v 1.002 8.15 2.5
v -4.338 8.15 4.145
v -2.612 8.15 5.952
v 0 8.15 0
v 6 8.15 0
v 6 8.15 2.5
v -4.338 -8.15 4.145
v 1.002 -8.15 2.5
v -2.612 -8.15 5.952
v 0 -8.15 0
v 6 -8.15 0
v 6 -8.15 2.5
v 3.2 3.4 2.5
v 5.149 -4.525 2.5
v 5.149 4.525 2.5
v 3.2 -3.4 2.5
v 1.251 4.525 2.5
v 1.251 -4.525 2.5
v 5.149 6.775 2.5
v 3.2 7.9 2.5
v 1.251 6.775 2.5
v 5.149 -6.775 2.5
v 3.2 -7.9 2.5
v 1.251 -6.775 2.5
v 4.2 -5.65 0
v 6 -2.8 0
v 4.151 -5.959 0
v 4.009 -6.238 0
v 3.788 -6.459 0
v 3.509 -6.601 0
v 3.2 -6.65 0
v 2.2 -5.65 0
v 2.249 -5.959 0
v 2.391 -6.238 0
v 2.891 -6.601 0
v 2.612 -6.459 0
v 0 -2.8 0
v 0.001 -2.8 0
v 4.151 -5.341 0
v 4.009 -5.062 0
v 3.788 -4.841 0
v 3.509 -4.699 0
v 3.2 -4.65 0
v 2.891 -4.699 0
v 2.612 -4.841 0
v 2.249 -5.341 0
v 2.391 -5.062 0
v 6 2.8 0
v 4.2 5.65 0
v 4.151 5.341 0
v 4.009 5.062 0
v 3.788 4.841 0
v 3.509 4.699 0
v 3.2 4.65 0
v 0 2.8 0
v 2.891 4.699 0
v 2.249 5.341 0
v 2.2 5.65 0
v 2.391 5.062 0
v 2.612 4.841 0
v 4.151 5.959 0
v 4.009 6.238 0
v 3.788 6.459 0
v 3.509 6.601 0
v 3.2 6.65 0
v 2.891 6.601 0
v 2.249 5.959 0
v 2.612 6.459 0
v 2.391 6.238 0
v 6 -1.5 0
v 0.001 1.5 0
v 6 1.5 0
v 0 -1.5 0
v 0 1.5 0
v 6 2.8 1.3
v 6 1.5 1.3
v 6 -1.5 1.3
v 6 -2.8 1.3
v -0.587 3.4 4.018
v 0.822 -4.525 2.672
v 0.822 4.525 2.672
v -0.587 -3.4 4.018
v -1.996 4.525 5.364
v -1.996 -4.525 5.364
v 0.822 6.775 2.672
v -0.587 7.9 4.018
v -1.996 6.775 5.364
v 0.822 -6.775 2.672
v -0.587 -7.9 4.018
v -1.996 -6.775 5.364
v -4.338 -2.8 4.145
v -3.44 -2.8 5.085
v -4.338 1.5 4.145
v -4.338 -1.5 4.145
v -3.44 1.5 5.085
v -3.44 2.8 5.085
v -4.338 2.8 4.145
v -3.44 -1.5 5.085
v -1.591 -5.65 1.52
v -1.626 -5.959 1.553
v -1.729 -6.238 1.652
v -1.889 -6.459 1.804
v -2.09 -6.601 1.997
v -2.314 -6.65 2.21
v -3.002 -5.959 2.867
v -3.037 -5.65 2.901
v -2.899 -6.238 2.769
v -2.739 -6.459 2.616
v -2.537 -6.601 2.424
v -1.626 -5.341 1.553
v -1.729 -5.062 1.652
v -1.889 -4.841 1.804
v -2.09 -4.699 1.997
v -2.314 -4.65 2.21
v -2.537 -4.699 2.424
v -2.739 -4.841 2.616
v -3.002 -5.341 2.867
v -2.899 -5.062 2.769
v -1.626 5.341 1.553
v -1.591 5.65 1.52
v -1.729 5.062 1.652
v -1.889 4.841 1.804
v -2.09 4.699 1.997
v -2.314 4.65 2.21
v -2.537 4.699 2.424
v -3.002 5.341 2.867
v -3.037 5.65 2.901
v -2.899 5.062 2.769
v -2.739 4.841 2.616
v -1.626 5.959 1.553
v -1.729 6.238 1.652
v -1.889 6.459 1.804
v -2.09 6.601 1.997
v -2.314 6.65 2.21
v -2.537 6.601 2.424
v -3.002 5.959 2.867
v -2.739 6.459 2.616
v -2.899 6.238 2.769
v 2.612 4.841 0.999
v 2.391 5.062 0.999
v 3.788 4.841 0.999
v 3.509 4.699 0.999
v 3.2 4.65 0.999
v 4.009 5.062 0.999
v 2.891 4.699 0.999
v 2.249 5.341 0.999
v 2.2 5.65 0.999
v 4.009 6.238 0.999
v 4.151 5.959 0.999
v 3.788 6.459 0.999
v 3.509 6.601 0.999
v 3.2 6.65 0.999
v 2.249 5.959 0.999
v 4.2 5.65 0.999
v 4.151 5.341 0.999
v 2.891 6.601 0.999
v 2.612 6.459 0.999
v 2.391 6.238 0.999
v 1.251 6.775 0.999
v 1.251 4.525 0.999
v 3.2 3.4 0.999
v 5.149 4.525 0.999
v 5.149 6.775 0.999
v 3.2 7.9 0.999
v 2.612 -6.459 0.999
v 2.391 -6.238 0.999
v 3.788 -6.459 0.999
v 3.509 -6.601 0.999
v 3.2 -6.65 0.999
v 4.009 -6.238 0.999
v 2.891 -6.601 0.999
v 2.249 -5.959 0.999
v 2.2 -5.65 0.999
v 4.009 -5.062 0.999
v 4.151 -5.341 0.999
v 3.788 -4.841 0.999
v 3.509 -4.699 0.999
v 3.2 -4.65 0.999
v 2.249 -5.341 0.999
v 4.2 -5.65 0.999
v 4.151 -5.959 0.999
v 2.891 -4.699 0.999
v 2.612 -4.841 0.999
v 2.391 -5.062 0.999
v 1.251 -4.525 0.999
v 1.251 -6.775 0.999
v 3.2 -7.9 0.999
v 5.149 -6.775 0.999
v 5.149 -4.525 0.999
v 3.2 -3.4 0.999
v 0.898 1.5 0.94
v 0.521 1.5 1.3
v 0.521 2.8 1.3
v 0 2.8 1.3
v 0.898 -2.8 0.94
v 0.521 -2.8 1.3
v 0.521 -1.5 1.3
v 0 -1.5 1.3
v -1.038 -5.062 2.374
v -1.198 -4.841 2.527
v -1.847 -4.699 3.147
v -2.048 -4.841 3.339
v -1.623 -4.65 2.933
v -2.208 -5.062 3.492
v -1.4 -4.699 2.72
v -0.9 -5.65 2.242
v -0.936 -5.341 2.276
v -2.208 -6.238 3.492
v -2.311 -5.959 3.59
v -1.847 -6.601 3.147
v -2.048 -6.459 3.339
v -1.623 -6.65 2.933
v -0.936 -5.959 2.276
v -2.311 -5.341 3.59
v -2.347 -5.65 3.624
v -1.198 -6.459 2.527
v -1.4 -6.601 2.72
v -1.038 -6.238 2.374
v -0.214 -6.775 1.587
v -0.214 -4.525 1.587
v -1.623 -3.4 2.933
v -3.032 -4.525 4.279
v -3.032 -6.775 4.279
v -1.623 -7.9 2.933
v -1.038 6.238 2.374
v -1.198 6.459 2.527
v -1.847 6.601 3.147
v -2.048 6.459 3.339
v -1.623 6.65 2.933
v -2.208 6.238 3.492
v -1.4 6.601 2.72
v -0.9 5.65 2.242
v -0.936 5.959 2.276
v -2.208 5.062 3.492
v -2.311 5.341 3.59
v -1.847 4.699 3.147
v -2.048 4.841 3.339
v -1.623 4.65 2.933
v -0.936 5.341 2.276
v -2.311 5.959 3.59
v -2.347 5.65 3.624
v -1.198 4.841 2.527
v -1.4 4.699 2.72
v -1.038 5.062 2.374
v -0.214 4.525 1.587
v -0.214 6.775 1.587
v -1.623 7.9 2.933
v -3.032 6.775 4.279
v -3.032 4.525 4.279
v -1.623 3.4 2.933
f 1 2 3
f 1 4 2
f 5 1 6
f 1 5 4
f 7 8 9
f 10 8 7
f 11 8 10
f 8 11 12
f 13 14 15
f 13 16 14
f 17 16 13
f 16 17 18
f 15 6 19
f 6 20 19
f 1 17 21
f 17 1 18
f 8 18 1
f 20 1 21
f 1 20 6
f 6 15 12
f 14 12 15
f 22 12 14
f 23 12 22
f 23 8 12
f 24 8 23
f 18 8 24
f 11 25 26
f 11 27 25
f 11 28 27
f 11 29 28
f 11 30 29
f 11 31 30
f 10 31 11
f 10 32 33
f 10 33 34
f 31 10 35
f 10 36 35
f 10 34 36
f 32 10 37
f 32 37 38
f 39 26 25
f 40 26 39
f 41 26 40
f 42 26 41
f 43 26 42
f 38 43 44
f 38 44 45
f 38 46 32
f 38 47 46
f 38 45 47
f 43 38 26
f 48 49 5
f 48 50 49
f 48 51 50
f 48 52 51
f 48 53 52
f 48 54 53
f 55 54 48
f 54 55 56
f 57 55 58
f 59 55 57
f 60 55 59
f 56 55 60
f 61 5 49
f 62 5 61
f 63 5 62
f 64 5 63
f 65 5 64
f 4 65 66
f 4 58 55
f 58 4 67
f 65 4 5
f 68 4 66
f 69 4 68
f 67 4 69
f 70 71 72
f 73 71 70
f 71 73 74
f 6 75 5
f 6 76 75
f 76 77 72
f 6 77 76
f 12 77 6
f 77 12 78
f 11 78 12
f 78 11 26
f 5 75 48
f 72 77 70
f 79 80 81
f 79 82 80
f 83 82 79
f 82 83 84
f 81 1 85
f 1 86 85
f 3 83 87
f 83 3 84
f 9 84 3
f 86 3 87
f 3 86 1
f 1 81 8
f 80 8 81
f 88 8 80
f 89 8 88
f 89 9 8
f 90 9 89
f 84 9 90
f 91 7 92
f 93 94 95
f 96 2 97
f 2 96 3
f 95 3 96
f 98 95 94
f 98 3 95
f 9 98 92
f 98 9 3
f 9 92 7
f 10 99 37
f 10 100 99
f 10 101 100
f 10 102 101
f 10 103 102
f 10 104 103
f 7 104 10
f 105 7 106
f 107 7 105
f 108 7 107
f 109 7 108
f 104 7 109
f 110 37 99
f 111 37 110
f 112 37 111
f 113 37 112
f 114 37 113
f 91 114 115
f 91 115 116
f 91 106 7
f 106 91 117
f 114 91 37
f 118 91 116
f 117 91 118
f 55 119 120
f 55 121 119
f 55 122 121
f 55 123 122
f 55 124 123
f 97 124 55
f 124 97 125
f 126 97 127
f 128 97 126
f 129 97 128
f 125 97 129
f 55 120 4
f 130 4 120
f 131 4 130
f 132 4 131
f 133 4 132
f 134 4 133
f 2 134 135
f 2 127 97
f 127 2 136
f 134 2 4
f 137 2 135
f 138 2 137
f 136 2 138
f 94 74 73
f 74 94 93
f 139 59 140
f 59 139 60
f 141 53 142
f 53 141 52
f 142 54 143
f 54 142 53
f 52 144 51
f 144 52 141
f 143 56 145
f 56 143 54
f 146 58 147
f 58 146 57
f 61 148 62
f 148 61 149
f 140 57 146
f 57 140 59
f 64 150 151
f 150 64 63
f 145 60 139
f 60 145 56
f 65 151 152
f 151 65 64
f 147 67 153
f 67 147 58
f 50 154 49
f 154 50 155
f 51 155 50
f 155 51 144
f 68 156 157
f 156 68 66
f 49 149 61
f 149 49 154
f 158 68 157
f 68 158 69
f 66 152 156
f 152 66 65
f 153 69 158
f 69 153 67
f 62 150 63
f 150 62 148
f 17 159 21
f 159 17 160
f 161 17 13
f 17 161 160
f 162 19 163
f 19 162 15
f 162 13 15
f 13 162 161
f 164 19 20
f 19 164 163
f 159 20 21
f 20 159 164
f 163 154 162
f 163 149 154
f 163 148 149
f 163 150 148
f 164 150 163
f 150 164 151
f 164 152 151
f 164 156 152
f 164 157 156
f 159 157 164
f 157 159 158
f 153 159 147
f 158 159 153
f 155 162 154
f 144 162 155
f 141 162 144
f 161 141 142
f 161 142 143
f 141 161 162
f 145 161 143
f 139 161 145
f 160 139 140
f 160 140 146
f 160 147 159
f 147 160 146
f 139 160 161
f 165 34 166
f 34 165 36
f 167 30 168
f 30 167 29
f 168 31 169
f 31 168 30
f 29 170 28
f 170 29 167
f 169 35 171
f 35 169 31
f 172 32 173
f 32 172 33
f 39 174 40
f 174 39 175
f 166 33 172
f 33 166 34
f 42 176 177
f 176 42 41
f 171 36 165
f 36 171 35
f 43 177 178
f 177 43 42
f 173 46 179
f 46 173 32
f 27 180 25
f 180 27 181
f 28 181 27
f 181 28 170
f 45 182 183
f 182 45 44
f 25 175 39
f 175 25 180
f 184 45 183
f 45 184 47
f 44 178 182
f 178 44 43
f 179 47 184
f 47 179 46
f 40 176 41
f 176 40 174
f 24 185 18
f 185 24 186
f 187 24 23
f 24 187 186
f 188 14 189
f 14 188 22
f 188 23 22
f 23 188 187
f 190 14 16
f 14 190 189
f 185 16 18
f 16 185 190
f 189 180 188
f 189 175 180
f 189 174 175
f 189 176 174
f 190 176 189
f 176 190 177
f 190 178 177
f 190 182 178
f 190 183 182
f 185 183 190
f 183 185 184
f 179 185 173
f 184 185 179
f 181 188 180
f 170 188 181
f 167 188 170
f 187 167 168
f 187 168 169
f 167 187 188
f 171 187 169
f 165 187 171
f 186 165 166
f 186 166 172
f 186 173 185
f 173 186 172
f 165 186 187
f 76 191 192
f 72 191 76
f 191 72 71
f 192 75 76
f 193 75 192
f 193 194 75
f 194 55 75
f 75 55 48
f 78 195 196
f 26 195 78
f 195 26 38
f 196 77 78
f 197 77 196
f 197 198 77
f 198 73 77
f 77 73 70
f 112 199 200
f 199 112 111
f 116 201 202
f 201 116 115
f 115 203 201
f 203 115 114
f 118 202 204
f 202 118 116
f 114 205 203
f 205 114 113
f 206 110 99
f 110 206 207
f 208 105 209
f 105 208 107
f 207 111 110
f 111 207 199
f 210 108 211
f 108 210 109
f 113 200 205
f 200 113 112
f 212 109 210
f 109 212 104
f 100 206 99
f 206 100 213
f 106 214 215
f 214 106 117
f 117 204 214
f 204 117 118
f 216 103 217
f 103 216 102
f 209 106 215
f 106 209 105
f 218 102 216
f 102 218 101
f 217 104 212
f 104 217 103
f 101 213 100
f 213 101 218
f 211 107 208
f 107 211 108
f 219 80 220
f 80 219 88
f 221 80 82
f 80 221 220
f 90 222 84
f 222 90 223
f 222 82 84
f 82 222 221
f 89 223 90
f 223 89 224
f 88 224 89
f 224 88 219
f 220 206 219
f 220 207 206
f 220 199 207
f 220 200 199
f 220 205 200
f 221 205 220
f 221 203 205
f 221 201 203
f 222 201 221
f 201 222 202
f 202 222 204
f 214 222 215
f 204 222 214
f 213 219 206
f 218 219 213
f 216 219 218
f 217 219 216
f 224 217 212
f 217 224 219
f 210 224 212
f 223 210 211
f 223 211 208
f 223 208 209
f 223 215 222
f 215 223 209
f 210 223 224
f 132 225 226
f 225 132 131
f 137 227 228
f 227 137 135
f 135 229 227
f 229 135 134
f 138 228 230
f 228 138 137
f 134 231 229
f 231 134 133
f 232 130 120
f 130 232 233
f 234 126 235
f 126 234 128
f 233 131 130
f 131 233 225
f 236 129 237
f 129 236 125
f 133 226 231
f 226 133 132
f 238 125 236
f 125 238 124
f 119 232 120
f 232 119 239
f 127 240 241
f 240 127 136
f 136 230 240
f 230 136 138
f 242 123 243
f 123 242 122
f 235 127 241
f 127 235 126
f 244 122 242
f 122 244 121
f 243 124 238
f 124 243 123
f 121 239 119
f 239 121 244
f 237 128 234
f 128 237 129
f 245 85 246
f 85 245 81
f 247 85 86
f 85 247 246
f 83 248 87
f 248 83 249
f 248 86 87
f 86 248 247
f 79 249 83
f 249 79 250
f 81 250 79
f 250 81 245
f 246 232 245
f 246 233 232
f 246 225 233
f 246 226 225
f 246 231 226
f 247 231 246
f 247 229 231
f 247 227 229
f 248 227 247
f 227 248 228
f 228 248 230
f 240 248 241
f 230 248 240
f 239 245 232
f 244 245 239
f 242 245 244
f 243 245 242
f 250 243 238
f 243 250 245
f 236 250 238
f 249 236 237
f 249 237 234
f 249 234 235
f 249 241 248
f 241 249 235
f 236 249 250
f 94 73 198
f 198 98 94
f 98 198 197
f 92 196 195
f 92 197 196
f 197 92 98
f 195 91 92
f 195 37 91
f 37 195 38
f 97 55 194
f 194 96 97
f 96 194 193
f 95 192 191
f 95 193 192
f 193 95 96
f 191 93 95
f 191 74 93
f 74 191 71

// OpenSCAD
d=.001;

module screw_hole(pos, depth, drill, nut)
{
	x = pos[0];
	y = pos[1];

	translate([x,y,-d/2])
	union()
	{
		cylinder(depth+d, drill/2);
		translate( [0,0,depth-1.5] )
			cylinder(depth, nut/2, nut/2, $fn=6);
	}
}

module plate(length, width, depth)
{
	translate([-length/2,0,0])
		cube([length, width, depth]);
}

module plate_holes(length, width, depth, holes, drill, nut, slits, slitwidth)
{
	translate([-length/2,0,0])
	{
		for (pos = holes)
			screw_hole(pos, depth, drill, nut);

		for (l = slits)
			translate([l-slitwidth/2,-d/2,-d])
				cube([slitwidth, width+d, slitwidth+d]);
	}
}

module angle_bracket(length, width, depth, dihedral, holes, drill, nut, slits, slitwidth)
{
	difference() {
		for(i = [-1,1] )
			rotate([ 90-dihedral/2,0,i*90])
				plate(length, width, depth);

		for(i = [-1,1] )
		{
			slits_side = concat( slits,  [ for (s = slits) (length-s) ]);
			rotate([ (180-dihedral)/2,0,i*90])
				plate_holes(length, width, depth, holes, drill, nut, slits_side, slitwidth);
		}
	}
}

dihedral_angle=136.30923289232;
rotate([ 0,90-dihedral_angle/2,0 ])
angle_bracket(16.30,          /* length        */
              6,              /* width         */
              2.5,            /* depth         */
              dihedral_angle, /* angle         */
              [               /* list of holes */
                [2.5,3.2],
                [16.30-2.5,3.2]
              ],
              2,              /* hole diameter (per printer tweaking) */
              4.5,            /* nut diameter (same)                  */
              [6],            /* slits (symmetrical) :-(              */
              1.3,            /* width/height of slits                */
              $fn=20);
